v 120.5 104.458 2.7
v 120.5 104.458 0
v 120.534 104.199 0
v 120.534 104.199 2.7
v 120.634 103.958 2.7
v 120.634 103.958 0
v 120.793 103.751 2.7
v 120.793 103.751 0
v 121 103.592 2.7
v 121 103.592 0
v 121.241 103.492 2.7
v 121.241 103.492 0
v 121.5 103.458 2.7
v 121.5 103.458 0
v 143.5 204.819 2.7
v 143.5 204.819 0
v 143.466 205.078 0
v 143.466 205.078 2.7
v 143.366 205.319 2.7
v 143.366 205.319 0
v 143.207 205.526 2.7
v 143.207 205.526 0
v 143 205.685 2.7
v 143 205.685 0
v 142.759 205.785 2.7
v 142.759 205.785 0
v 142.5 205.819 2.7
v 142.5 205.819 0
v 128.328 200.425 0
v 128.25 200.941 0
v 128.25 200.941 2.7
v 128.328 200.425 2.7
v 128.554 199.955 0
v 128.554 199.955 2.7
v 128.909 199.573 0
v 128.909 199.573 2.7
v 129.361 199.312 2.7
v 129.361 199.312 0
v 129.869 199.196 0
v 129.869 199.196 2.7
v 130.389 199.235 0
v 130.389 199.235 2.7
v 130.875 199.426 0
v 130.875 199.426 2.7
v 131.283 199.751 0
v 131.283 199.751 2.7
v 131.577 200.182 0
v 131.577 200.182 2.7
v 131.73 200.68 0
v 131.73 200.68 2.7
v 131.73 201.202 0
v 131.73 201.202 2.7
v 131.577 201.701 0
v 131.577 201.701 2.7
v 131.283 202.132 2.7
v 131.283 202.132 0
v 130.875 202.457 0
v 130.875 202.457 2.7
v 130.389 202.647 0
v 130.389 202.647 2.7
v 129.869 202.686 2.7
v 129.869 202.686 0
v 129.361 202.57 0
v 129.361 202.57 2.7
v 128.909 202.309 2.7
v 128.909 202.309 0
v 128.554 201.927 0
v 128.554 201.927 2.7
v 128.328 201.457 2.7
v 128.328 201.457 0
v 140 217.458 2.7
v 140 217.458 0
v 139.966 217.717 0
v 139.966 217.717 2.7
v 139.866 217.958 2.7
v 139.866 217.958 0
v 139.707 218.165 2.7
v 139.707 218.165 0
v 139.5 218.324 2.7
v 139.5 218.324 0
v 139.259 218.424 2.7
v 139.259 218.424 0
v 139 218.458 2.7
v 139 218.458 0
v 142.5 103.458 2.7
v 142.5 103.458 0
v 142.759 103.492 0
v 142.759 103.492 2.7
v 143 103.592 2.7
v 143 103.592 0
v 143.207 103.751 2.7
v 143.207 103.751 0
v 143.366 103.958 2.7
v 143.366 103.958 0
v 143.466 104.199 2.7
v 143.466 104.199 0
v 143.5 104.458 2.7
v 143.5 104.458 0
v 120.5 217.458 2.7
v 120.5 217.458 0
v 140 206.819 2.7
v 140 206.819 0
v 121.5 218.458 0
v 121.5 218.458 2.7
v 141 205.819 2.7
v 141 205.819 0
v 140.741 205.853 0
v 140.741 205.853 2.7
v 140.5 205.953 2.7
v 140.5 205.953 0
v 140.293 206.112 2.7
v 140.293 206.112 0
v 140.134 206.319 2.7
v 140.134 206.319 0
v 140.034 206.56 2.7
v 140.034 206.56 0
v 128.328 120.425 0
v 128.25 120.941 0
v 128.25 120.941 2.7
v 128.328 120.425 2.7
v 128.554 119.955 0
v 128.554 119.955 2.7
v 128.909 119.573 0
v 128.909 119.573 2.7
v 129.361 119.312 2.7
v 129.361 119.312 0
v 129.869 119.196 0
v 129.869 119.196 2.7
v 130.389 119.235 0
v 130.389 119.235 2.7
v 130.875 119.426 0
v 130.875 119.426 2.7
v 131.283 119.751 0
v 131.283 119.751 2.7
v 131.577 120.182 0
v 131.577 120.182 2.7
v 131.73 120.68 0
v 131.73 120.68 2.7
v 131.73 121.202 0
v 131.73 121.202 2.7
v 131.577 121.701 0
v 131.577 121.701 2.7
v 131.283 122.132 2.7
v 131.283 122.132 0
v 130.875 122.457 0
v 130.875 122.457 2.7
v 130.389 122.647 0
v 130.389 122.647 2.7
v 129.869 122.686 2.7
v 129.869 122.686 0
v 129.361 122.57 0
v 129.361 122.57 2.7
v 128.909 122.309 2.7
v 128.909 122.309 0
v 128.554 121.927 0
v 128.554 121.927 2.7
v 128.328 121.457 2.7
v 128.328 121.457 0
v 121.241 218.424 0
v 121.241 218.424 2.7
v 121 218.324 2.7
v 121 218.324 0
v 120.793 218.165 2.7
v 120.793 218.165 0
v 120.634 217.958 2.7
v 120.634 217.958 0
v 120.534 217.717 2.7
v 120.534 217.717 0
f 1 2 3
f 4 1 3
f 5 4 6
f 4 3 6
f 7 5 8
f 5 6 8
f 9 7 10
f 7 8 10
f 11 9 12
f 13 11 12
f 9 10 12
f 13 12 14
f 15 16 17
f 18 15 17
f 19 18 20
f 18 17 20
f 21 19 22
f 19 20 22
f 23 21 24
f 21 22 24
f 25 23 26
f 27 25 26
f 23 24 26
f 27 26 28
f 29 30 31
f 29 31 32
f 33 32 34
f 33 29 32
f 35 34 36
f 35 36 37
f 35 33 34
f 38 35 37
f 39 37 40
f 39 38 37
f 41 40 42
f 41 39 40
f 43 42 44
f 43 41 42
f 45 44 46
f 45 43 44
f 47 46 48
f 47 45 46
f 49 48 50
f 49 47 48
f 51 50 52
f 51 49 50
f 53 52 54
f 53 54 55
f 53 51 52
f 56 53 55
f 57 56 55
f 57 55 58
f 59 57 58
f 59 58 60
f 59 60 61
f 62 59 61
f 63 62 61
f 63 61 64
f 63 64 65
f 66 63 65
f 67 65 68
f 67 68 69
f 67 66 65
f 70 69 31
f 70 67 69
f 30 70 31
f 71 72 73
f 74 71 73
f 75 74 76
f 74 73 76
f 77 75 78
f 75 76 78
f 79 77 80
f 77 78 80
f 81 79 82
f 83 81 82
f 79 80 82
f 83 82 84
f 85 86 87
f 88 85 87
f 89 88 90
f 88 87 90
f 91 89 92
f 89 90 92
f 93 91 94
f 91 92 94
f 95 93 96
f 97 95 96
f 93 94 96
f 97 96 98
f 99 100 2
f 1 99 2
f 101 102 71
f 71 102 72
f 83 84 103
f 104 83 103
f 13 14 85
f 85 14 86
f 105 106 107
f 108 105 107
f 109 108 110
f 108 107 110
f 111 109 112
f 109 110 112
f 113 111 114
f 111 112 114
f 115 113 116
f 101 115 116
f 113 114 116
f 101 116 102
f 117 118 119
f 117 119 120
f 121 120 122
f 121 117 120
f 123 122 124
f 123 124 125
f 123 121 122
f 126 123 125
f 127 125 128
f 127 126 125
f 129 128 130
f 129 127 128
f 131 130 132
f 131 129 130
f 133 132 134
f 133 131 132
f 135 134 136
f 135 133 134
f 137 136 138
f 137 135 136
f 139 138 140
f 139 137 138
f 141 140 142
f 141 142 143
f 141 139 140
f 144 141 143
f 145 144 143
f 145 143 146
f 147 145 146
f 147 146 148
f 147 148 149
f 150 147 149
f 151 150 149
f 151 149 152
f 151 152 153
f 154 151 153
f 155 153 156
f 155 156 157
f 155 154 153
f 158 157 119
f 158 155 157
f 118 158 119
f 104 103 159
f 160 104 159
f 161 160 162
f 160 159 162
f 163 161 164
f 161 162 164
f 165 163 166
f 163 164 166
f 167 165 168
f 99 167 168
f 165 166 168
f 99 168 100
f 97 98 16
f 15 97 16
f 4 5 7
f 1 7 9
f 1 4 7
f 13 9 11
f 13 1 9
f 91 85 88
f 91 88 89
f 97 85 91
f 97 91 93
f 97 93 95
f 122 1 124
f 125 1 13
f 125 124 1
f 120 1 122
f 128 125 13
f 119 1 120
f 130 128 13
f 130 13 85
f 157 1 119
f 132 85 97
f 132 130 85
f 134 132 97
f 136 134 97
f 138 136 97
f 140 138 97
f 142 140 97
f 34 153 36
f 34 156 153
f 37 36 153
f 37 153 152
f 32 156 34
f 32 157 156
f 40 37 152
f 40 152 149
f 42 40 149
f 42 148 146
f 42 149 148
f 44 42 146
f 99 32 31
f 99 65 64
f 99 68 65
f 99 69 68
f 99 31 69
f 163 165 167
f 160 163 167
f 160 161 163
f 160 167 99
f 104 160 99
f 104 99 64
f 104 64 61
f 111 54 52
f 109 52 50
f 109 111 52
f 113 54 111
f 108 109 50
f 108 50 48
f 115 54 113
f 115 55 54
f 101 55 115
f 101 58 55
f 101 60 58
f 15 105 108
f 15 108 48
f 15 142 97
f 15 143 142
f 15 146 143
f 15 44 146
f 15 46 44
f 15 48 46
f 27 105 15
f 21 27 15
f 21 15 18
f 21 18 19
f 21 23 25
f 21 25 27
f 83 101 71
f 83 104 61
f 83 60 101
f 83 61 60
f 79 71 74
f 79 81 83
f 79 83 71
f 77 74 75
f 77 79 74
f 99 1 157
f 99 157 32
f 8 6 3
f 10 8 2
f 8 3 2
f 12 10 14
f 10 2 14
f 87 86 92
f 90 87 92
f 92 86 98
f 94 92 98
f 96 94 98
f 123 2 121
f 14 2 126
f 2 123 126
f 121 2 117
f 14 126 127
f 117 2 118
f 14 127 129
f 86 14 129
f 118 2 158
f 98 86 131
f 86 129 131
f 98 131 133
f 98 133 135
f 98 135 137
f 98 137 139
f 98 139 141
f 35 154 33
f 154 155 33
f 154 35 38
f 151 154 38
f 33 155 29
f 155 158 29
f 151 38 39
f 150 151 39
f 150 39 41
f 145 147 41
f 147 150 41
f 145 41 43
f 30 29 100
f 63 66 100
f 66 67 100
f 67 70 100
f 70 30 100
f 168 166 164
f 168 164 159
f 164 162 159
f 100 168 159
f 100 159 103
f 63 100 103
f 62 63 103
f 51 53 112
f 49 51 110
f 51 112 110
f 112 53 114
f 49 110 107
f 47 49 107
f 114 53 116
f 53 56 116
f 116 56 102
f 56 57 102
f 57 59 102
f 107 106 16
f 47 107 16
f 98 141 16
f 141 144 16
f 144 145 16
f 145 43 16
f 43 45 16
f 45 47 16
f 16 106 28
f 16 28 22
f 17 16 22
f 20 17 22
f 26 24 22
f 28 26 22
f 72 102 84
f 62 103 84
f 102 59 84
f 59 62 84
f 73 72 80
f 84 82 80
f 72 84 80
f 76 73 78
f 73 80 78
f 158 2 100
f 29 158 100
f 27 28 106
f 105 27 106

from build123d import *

# Parameters (mm, degrees)
SKETCH1_R           = 1.75
BOSS_EXTRUDE1_DEPTH = 2.7


with BuildPart() as part:
    # Sketch1 → Boss-Extrude1 (new body)
    with BuildSketch(Plane.XY):
        with BuildLine():
            Line((142.5, 205.819306835), (141, 205.819306835))
            ThreePointArc((141, 205.819306835), (140.292893219, 206.112200054), (140, 206.819306835))
            Line((140, 206.819306835), (140, 217.457909006))
            ThreePointArc((140, 217.457909006), (139.707106781, 218.165015787), (139, 218.457909006))
            Line((139, 218.457909006), (121.5, 218.457909006))
            ThreePointArc((121.5, 218.457909006), (120.792893219, 218.165015787), (120.5, 217.457909006))
            Line((120.5, 217.457909006), (120.5, 104.457909006))
            ThreePointArc((120.5, 104.457909006), (120.792893219, 103.750802225), (121.5, 103.457909006))
            Line((121.5, 103.457909006), (142.5, 103.457909006))
            ThreePointArc((142.5, 103.457909006), (143.207106781, 103.750802225), (143.5, 104.457909006))
            Line((143.5, 104.457909006), (143.5, 204.819306835))
            ThreePointArc((143.5, 204.819306835), (143.207106781, 205.526413617), (142.5, 205.819306835))
        make_face()
        with Locations(Location((130, 200.941258447, 0), (0, 0, 180))):
            Circle(SKETCH1_R, mode=Mode.SUBTRACT)
        with Locations(Location((130, 120.941258447, 0), (0, 0, 180))):
            Circle(SKETCH1_R, mode=Mode.SUBTRACT)
    extrude(amount=BOSS_EXTRUDE1_DEPTH)


solid = part.part
